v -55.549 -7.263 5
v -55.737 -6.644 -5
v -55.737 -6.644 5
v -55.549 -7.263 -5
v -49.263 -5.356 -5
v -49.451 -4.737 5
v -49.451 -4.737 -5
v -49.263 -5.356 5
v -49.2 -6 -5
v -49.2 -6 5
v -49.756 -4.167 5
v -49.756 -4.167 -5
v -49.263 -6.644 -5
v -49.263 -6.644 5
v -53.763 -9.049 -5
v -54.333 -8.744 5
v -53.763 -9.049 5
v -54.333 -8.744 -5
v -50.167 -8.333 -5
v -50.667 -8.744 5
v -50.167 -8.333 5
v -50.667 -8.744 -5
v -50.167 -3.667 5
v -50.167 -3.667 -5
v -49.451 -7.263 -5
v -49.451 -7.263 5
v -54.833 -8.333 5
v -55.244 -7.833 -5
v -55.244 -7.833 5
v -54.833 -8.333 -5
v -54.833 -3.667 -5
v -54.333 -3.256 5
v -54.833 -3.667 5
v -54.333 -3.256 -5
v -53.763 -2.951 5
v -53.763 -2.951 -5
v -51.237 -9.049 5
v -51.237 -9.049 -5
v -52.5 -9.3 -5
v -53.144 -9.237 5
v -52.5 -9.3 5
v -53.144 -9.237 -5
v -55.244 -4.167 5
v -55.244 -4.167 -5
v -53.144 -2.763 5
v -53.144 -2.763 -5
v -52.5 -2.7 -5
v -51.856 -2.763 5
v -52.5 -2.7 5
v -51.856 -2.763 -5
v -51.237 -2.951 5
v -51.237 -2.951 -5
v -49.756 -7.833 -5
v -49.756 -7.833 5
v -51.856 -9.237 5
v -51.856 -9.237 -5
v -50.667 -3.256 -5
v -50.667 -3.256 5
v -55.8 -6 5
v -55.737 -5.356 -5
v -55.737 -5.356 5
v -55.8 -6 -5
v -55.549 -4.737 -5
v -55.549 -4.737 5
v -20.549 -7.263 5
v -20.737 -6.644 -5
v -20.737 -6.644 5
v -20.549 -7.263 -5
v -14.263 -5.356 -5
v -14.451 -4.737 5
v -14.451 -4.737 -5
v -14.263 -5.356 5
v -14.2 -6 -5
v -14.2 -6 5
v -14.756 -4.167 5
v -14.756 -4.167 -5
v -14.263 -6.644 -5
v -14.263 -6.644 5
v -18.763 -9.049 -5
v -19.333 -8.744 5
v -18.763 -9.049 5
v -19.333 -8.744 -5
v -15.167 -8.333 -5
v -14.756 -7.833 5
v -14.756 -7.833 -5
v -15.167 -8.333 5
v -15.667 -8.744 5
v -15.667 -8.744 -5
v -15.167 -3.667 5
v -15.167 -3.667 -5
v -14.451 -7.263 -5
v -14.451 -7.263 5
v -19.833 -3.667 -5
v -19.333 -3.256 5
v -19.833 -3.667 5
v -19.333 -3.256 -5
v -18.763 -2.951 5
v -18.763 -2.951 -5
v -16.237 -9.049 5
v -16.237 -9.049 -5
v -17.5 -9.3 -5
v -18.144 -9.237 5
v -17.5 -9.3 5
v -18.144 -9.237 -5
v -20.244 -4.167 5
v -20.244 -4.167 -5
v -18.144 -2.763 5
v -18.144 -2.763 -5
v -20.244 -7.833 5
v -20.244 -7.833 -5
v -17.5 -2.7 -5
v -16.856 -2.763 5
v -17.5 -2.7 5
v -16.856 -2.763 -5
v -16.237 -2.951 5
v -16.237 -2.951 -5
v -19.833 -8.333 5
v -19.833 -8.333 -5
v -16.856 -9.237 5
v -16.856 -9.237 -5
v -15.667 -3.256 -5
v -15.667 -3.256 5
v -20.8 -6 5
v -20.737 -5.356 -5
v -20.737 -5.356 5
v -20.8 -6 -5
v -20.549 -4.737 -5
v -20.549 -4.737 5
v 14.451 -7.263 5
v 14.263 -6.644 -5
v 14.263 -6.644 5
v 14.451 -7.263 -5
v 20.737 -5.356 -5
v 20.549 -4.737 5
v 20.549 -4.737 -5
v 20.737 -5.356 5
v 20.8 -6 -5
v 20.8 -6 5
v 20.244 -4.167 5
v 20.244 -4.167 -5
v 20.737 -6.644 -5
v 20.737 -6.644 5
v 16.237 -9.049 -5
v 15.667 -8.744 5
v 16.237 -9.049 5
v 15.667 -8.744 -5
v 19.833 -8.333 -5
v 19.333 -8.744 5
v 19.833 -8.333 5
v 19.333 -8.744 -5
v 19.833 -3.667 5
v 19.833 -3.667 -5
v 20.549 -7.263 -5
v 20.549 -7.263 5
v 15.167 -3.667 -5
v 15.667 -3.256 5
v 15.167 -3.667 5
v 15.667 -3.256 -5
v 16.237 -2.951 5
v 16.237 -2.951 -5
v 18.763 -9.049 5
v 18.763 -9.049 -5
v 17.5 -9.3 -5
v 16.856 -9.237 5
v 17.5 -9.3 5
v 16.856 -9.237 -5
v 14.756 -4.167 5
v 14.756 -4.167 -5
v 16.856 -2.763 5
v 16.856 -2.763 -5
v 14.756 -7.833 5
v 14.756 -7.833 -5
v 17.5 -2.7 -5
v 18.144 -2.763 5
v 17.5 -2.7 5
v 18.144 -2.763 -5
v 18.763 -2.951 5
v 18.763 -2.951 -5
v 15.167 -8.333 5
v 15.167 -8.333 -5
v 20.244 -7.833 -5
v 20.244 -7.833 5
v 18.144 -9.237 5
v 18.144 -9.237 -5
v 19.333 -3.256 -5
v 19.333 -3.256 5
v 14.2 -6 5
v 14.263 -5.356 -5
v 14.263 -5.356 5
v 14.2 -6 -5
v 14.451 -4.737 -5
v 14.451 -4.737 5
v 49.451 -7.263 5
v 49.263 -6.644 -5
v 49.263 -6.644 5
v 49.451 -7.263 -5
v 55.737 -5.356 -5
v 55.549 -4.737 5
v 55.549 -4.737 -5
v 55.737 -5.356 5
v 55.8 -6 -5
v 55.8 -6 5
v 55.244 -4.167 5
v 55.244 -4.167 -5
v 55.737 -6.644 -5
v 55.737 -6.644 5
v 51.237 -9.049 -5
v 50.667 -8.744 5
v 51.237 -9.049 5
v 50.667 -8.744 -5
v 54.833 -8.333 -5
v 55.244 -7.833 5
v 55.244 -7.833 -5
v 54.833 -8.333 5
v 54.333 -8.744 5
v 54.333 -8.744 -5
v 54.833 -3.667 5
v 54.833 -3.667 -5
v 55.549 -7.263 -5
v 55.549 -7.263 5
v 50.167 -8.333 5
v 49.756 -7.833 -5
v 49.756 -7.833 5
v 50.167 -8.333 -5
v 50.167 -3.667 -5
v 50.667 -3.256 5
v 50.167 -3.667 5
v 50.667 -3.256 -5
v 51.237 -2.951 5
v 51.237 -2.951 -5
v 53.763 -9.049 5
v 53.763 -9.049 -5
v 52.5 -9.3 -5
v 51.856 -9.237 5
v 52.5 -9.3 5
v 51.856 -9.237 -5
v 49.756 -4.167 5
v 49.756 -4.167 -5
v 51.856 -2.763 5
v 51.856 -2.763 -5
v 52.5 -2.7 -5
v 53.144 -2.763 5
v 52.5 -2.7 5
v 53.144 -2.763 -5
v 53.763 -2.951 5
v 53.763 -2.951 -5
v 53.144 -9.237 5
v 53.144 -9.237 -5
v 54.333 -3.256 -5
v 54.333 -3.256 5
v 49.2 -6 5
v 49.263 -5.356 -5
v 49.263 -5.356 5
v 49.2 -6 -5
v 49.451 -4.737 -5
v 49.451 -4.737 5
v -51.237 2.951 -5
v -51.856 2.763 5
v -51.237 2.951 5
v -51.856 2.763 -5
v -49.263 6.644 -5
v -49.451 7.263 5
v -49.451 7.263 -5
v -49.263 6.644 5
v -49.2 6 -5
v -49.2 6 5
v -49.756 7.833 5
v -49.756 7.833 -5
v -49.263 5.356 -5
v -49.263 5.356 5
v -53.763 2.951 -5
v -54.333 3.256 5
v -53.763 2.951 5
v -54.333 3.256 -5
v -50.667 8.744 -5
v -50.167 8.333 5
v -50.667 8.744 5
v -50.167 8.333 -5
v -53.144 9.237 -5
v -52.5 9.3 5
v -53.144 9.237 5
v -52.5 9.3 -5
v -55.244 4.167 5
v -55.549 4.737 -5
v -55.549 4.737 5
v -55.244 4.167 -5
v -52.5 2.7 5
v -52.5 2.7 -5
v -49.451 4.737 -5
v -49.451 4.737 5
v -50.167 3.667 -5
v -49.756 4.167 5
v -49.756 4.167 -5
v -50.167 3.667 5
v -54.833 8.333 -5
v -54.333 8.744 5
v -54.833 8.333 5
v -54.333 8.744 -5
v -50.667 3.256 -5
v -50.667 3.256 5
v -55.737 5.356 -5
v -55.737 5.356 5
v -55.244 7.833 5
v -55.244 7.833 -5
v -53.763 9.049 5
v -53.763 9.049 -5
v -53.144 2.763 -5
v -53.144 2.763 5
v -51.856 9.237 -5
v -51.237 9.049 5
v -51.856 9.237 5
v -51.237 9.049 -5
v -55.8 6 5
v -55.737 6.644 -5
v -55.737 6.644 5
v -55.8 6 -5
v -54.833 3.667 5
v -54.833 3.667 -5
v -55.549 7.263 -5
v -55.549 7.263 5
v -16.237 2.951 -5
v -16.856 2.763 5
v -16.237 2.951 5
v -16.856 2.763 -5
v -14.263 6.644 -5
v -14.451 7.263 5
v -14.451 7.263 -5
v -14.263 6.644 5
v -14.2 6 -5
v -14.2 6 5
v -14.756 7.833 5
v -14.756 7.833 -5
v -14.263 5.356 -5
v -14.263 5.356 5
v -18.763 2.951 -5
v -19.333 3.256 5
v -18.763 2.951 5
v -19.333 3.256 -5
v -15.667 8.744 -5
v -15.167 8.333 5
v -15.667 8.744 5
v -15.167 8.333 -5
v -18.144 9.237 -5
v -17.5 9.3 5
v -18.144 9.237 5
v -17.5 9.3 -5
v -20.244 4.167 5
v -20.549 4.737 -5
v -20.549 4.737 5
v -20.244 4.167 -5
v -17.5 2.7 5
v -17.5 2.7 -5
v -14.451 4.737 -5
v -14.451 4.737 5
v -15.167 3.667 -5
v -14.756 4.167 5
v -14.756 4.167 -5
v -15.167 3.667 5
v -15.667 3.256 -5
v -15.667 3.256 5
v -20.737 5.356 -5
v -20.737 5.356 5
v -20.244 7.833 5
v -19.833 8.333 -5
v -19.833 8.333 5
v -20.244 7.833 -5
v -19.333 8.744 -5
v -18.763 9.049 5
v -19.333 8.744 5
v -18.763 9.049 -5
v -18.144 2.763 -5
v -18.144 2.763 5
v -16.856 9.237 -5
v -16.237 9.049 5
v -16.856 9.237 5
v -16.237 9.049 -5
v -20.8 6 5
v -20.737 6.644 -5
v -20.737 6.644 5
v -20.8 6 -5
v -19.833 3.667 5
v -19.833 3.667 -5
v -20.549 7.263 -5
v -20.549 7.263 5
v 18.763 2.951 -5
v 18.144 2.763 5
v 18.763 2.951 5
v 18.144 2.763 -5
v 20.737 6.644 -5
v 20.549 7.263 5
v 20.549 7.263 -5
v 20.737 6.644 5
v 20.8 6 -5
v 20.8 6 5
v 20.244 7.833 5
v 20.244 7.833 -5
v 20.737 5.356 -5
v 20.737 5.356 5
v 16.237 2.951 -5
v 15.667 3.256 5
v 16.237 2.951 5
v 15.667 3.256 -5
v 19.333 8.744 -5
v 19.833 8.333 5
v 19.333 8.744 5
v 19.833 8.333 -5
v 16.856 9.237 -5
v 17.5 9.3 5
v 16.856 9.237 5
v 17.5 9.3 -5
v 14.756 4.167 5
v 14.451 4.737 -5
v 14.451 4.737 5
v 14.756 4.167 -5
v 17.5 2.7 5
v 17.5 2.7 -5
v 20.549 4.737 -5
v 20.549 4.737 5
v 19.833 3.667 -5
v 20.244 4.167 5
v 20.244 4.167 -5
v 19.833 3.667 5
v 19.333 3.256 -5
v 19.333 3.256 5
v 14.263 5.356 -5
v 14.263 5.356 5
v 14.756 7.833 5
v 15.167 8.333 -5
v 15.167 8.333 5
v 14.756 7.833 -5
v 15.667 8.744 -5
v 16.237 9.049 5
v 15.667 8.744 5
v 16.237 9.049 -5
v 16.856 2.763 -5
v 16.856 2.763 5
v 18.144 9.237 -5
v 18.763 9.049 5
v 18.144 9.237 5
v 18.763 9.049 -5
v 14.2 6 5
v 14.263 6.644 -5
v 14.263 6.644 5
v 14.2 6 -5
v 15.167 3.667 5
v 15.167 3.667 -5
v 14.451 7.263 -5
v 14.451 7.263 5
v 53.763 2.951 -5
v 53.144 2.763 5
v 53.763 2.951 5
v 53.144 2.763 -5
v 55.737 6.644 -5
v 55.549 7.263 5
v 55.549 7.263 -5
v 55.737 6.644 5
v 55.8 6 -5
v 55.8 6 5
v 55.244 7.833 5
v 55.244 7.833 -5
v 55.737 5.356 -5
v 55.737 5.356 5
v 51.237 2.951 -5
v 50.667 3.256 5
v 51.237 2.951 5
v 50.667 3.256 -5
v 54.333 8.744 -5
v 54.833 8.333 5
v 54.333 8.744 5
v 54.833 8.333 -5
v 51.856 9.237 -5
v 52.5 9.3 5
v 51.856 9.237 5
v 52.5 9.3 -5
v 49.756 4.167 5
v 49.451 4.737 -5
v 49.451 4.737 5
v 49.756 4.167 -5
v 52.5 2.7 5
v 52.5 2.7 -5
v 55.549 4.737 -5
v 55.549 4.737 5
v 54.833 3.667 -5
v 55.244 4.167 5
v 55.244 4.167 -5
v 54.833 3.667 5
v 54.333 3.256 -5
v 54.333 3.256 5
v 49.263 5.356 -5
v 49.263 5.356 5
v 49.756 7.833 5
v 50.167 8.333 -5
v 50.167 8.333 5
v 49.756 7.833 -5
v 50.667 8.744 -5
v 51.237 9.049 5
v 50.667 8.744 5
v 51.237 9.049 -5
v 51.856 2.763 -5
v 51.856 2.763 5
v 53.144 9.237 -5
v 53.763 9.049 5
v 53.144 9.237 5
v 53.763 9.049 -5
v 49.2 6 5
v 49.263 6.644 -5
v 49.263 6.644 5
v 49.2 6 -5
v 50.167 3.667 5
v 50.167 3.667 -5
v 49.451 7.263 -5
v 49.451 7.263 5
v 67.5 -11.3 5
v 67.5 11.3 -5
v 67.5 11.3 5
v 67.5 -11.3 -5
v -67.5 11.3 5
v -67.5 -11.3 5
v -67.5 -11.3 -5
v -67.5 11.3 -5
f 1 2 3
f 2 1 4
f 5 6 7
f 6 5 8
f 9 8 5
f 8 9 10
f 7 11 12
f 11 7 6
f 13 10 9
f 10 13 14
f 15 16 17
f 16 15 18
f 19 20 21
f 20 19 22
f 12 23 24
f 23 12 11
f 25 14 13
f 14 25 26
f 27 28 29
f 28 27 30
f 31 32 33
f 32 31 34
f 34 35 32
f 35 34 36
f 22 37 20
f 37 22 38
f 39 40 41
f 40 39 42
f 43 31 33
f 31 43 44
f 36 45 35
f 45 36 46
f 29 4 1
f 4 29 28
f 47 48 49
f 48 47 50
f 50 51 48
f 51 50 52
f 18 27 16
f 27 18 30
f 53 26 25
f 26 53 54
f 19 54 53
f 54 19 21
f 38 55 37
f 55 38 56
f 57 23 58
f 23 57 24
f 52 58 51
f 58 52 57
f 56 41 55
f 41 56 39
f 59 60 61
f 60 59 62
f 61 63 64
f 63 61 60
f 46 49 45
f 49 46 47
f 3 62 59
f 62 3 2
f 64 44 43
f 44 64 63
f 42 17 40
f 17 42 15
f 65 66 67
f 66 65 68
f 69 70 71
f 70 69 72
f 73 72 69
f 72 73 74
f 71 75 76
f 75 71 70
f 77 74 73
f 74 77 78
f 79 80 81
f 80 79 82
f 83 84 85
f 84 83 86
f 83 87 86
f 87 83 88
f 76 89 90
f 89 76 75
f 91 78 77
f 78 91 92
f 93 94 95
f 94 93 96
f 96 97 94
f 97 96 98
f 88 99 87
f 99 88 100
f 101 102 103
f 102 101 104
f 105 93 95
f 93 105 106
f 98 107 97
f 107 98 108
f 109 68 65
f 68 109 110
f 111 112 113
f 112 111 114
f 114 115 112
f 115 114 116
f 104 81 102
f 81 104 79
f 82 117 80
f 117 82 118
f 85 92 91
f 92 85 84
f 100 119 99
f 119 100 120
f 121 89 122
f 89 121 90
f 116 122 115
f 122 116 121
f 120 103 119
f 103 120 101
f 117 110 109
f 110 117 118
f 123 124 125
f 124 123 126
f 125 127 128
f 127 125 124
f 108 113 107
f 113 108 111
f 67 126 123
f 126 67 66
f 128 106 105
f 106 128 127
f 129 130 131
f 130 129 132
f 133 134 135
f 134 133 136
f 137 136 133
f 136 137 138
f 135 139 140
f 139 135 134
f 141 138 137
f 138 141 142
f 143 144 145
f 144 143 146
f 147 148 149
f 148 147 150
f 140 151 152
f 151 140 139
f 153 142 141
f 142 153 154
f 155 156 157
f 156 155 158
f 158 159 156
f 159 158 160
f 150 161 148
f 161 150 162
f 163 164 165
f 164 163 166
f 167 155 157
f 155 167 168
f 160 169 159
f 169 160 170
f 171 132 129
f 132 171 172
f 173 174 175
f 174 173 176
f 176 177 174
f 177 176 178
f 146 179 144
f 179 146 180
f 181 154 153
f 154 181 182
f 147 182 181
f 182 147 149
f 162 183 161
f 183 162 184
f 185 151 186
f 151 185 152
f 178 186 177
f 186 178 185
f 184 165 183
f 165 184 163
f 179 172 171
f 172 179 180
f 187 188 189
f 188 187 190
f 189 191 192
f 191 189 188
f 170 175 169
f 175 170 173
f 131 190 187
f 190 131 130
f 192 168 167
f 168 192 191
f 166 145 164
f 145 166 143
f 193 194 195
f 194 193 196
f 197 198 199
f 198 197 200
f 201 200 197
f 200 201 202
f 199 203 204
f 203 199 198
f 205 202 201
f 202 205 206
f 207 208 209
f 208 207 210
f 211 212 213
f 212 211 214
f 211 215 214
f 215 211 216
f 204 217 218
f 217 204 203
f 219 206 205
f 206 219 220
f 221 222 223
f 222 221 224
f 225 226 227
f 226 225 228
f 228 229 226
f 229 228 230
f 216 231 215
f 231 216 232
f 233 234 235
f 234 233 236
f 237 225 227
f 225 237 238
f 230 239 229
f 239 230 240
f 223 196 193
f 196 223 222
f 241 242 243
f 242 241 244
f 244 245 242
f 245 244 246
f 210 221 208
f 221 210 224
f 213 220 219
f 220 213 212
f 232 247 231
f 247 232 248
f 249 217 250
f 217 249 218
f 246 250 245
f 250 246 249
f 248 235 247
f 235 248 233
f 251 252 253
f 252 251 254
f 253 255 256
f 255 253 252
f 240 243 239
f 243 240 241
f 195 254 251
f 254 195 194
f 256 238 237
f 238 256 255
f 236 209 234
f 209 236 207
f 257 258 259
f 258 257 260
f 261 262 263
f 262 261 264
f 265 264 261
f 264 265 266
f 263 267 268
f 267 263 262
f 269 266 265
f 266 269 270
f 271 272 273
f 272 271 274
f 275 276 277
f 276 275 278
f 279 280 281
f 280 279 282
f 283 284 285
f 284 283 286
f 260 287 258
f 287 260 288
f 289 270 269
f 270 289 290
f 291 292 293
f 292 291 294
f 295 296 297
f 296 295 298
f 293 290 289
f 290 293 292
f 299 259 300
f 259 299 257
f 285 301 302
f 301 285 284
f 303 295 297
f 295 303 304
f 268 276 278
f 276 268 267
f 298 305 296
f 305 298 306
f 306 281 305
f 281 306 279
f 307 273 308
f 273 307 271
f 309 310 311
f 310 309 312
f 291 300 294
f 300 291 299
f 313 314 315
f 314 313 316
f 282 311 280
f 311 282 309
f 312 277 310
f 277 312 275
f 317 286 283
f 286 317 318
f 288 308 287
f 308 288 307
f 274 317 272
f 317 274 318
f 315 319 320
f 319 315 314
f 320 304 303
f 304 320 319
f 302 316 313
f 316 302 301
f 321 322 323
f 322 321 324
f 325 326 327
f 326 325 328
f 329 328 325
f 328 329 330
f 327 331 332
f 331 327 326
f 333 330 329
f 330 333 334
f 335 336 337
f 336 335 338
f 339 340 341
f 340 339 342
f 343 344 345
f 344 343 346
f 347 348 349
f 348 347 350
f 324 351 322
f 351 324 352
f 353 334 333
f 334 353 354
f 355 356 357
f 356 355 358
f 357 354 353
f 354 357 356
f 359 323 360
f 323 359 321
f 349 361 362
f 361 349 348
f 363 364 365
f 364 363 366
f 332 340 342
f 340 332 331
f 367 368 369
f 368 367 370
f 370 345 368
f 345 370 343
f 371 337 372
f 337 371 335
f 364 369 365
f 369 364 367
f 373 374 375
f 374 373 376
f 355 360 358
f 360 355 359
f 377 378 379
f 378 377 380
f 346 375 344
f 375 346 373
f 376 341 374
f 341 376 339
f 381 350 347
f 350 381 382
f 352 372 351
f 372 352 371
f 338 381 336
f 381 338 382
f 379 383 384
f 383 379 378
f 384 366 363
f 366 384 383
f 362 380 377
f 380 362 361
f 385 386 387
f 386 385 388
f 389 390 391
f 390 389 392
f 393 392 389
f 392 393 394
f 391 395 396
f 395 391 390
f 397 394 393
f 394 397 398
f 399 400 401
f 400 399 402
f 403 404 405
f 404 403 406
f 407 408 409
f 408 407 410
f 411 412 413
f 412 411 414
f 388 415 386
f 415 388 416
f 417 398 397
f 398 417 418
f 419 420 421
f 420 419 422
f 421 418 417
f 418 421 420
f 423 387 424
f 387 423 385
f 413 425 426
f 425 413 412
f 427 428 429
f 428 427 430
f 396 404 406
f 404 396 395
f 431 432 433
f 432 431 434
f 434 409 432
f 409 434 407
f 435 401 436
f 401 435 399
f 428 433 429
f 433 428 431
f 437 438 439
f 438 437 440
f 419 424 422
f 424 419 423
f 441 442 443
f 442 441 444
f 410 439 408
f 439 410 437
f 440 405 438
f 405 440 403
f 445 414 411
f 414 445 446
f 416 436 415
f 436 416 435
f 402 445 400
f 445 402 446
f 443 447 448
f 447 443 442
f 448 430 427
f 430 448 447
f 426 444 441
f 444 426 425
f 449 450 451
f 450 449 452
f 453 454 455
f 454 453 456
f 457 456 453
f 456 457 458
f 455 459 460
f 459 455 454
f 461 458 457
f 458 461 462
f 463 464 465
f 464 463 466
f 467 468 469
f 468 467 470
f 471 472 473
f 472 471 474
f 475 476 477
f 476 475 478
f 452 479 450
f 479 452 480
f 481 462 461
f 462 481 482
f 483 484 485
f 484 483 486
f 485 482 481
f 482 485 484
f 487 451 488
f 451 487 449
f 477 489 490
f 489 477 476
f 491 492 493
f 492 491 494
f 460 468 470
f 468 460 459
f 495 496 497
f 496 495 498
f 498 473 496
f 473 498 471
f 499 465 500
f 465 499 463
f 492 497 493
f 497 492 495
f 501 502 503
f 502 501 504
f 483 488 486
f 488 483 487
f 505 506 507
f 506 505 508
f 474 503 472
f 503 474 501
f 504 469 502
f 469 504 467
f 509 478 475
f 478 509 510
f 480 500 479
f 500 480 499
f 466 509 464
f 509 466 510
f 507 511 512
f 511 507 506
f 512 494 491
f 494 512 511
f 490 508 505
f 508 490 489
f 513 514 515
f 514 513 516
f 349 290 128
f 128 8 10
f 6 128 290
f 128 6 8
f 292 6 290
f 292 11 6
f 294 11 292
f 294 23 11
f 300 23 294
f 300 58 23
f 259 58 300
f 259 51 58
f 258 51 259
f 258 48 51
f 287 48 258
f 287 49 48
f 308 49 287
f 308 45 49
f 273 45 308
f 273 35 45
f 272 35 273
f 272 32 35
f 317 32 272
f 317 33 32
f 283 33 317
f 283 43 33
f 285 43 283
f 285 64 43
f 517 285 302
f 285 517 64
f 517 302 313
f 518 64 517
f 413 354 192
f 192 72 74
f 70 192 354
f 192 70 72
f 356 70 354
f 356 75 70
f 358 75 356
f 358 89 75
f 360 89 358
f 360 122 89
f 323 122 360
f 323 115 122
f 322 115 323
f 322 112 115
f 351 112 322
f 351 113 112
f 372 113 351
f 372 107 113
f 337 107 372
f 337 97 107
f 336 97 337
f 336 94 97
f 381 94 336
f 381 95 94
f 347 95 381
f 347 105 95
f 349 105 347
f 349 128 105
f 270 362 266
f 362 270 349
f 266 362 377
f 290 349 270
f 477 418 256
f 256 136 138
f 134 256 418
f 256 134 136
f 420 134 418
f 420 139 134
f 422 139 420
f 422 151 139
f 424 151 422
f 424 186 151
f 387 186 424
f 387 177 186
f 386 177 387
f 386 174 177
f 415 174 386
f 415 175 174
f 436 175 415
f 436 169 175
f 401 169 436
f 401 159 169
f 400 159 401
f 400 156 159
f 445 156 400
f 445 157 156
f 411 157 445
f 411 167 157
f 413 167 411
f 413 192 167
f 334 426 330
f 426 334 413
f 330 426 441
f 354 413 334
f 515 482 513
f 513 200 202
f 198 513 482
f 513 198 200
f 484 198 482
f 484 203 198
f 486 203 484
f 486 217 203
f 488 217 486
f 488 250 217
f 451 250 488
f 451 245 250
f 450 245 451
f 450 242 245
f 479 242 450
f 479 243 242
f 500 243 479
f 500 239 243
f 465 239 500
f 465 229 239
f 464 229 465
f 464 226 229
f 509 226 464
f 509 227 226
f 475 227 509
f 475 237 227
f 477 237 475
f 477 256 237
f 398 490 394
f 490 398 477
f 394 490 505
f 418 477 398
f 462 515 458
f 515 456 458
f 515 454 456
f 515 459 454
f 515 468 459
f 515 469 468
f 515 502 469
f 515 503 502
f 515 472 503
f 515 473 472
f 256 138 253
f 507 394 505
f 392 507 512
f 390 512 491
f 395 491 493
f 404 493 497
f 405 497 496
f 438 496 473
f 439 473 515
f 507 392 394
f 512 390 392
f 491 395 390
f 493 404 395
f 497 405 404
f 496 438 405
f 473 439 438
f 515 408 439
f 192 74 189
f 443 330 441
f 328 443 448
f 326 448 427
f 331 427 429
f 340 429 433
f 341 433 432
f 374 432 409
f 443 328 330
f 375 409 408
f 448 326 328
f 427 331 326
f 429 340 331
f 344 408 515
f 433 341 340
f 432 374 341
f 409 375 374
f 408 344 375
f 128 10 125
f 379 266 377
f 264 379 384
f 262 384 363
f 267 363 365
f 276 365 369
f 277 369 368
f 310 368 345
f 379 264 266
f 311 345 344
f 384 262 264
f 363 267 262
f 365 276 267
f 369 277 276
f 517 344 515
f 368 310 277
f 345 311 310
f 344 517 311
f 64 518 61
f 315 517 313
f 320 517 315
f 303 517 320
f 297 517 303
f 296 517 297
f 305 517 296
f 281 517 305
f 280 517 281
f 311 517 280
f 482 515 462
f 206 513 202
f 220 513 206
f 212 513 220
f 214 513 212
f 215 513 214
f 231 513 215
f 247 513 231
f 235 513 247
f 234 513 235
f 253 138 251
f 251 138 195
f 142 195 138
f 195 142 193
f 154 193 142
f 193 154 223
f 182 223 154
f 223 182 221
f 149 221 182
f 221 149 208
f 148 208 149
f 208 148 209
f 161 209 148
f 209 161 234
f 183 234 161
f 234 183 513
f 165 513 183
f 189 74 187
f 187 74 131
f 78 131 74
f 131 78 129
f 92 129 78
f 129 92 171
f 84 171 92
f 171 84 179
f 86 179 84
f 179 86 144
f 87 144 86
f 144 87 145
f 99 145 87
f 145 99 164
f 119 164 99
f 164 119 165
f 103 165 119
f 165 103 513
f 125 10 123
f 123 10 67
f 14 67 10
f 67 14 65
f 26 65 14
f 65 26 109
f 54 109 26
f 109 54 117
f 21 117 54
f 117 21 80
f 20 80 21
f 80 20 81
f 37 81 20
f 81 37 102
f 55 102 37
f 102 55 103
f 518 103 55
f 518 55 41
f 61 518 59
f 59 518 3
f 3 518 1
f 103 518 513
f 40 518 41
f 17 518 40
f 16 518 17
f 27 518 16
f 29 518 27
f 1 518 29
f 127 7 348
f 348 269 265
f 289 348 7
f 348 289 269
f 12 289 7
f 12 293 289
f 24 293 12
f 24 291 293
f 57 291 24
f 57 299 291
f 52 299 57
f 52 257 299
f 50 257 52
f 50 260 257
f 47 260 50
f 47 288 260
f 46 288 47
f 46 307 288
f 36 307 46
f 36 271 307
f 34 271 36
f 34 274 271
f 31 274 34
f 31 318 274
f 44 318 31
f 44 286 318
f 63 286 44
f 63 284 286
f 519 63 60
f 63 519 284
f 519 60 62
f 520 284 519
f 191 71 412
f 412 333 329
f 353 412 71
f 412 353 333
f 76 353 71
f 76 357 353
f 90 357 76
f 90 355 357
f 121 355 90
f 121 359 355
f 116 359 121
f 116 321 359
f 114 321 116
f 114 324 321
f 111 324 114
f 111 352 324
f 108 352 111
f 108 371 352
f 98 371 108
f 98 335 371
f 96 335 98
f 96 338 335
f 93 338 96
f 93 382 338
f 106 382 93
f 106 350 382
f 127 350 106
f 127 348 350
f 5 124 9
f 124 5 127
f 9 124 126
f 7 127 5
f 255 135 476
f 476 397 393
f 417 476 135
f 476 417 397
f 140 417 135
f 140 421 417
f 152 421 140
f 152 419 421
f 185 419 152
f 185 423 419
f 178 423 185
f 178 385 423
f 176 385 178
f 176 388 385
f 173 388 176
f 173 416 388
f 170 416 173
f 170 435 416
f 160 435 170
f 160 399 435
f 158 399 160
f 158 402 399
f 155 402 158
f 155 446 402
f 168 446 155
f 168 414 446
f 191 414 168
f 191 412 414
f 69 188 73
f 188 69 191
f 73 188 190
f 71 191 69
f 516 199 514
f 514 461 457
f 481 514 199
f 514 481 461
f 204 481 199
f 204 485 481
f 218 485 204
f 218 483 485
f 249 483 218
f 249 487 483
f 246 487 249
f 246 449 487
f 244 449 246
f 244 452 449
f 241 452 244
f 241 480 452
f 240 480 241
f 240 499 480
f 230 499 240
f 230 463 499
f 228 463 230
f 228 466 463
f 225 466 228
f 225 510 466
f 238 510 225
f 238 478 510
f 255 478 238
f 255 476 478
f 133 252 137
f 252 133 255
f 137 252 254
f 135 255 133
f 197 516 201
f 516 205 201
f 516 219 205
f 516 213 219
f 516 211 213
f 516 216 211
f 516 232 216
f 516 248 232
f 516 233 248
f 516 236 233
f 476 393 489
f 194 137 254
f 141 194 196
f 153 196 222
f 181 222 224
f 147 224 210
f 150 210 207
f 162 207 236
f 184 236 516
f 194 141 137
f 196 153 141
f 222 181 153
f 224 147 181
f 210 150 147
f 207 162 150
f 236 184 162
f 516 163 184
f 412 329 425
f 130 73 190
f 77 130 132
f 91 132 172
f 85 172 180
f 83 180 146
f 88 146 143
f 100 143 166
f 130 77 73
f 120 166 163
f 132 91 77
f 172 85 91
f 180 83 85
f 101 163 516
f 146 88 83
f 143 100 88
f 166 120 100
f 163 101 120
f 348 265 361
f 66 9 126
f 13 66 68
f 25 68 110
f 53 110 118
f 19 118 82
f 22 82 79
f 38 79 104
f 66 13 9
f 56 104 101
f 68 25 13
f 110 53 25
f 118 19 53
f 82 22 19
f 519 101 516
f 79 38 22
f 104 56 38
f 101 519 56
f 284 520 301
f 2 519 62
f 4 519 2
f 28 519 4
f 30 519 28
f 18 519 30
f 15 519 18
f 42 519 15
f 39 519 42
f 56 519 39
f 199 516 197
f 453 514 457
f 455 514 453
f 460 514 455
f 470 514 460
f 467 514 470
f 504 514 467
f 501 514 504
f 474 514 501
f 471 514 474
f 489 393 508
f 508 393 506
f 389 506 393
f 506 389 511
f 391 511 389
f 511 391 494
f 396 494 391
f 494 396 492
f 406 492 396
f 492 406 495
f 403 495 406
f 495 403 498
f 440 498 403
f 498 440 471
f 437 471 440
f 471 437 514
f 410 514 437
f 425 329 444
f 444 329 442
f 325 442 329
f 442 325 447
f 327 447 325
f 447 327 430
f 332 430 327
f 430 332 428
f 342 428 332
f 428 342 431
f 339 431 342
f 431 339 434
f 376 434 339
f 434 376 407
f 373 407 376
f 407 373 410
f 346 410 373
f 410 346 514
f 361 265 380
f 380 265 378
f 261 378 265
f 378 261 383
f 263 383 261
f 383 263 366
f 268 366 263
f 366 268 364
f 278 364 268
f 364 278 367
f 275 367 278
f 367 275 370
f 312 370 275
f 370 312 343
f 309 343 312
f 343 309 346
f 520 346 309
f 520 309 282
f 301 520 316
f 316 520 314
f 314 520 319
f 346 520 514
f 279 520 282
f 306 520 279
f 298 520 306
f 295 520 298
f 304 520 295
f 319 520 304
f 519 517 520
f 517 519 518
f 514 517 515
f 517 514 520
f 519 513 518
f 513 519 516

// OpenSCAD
$fn = 32;

// ----------------------------------------------------------------------
// Hole bar, 4 x Ø6.6
// tworows layout, 15 mm edge offset
// ----------------------------------------------------------------------

// --- parameters (mm) ---
bar_w = 22.6;     // bar width (Y)
bar_t = 10;       // bar thickness (Z)
holes = 4;        // holes per row
hole_d = 6.6;     // hole diameter
edge = 15;        // offset from the bar end to the first hole
pitch = 35;       // pitch between neighbouring holes
row_offset = 12;  // distance between the two rows

// --- derived feature positions (mm) ---
span = (holes - 1) * pitch;   // = 105   distance between the end holes
bar_l = span + 2 * edge;      // = 135   overall bar length
start_x = -bar_l / 2 + edge;  // = -52.5   X of the first hole
feature_centers = [
  [start_x + 0 * pitch, -row_offset / 2],
  [start_x + 1 * pitch, -row_offset / 2],
  [start_x + 2 * pitch, -row_offset / 2],
  [start_x + 3 * pitch, -row_offset / 2]
];   // hole centres of the first row
row2_centers = [
  [start_x + 0 * pitch, row_offset / 2],
  [start_x + 1 * pitch, row_offset / 2],
  [start_x + 2 * pitch, row_offset / 2],
  [start_x + 3 * pitch, row_offset / 2]
];   // hole centres of the second row

// bar with two rows of holes, both read from their own centre arrays
difference() {
  translate([-bar_l / 2, -bar_w / 2, -bar_t / 2]) cube([bar_l, bar_w, bar_t]);
  for (centre = feature_centers)
    translate([centre[0], centre[1], 0])
      cylinder(d = hole_d, h = bar_t + 2, center = true);
  for (centre = row2_centers)
    translate([centre[0], centre[1], 0])
      cylinder(d = hole_d, h = bar_t + 2, center = true);
}
